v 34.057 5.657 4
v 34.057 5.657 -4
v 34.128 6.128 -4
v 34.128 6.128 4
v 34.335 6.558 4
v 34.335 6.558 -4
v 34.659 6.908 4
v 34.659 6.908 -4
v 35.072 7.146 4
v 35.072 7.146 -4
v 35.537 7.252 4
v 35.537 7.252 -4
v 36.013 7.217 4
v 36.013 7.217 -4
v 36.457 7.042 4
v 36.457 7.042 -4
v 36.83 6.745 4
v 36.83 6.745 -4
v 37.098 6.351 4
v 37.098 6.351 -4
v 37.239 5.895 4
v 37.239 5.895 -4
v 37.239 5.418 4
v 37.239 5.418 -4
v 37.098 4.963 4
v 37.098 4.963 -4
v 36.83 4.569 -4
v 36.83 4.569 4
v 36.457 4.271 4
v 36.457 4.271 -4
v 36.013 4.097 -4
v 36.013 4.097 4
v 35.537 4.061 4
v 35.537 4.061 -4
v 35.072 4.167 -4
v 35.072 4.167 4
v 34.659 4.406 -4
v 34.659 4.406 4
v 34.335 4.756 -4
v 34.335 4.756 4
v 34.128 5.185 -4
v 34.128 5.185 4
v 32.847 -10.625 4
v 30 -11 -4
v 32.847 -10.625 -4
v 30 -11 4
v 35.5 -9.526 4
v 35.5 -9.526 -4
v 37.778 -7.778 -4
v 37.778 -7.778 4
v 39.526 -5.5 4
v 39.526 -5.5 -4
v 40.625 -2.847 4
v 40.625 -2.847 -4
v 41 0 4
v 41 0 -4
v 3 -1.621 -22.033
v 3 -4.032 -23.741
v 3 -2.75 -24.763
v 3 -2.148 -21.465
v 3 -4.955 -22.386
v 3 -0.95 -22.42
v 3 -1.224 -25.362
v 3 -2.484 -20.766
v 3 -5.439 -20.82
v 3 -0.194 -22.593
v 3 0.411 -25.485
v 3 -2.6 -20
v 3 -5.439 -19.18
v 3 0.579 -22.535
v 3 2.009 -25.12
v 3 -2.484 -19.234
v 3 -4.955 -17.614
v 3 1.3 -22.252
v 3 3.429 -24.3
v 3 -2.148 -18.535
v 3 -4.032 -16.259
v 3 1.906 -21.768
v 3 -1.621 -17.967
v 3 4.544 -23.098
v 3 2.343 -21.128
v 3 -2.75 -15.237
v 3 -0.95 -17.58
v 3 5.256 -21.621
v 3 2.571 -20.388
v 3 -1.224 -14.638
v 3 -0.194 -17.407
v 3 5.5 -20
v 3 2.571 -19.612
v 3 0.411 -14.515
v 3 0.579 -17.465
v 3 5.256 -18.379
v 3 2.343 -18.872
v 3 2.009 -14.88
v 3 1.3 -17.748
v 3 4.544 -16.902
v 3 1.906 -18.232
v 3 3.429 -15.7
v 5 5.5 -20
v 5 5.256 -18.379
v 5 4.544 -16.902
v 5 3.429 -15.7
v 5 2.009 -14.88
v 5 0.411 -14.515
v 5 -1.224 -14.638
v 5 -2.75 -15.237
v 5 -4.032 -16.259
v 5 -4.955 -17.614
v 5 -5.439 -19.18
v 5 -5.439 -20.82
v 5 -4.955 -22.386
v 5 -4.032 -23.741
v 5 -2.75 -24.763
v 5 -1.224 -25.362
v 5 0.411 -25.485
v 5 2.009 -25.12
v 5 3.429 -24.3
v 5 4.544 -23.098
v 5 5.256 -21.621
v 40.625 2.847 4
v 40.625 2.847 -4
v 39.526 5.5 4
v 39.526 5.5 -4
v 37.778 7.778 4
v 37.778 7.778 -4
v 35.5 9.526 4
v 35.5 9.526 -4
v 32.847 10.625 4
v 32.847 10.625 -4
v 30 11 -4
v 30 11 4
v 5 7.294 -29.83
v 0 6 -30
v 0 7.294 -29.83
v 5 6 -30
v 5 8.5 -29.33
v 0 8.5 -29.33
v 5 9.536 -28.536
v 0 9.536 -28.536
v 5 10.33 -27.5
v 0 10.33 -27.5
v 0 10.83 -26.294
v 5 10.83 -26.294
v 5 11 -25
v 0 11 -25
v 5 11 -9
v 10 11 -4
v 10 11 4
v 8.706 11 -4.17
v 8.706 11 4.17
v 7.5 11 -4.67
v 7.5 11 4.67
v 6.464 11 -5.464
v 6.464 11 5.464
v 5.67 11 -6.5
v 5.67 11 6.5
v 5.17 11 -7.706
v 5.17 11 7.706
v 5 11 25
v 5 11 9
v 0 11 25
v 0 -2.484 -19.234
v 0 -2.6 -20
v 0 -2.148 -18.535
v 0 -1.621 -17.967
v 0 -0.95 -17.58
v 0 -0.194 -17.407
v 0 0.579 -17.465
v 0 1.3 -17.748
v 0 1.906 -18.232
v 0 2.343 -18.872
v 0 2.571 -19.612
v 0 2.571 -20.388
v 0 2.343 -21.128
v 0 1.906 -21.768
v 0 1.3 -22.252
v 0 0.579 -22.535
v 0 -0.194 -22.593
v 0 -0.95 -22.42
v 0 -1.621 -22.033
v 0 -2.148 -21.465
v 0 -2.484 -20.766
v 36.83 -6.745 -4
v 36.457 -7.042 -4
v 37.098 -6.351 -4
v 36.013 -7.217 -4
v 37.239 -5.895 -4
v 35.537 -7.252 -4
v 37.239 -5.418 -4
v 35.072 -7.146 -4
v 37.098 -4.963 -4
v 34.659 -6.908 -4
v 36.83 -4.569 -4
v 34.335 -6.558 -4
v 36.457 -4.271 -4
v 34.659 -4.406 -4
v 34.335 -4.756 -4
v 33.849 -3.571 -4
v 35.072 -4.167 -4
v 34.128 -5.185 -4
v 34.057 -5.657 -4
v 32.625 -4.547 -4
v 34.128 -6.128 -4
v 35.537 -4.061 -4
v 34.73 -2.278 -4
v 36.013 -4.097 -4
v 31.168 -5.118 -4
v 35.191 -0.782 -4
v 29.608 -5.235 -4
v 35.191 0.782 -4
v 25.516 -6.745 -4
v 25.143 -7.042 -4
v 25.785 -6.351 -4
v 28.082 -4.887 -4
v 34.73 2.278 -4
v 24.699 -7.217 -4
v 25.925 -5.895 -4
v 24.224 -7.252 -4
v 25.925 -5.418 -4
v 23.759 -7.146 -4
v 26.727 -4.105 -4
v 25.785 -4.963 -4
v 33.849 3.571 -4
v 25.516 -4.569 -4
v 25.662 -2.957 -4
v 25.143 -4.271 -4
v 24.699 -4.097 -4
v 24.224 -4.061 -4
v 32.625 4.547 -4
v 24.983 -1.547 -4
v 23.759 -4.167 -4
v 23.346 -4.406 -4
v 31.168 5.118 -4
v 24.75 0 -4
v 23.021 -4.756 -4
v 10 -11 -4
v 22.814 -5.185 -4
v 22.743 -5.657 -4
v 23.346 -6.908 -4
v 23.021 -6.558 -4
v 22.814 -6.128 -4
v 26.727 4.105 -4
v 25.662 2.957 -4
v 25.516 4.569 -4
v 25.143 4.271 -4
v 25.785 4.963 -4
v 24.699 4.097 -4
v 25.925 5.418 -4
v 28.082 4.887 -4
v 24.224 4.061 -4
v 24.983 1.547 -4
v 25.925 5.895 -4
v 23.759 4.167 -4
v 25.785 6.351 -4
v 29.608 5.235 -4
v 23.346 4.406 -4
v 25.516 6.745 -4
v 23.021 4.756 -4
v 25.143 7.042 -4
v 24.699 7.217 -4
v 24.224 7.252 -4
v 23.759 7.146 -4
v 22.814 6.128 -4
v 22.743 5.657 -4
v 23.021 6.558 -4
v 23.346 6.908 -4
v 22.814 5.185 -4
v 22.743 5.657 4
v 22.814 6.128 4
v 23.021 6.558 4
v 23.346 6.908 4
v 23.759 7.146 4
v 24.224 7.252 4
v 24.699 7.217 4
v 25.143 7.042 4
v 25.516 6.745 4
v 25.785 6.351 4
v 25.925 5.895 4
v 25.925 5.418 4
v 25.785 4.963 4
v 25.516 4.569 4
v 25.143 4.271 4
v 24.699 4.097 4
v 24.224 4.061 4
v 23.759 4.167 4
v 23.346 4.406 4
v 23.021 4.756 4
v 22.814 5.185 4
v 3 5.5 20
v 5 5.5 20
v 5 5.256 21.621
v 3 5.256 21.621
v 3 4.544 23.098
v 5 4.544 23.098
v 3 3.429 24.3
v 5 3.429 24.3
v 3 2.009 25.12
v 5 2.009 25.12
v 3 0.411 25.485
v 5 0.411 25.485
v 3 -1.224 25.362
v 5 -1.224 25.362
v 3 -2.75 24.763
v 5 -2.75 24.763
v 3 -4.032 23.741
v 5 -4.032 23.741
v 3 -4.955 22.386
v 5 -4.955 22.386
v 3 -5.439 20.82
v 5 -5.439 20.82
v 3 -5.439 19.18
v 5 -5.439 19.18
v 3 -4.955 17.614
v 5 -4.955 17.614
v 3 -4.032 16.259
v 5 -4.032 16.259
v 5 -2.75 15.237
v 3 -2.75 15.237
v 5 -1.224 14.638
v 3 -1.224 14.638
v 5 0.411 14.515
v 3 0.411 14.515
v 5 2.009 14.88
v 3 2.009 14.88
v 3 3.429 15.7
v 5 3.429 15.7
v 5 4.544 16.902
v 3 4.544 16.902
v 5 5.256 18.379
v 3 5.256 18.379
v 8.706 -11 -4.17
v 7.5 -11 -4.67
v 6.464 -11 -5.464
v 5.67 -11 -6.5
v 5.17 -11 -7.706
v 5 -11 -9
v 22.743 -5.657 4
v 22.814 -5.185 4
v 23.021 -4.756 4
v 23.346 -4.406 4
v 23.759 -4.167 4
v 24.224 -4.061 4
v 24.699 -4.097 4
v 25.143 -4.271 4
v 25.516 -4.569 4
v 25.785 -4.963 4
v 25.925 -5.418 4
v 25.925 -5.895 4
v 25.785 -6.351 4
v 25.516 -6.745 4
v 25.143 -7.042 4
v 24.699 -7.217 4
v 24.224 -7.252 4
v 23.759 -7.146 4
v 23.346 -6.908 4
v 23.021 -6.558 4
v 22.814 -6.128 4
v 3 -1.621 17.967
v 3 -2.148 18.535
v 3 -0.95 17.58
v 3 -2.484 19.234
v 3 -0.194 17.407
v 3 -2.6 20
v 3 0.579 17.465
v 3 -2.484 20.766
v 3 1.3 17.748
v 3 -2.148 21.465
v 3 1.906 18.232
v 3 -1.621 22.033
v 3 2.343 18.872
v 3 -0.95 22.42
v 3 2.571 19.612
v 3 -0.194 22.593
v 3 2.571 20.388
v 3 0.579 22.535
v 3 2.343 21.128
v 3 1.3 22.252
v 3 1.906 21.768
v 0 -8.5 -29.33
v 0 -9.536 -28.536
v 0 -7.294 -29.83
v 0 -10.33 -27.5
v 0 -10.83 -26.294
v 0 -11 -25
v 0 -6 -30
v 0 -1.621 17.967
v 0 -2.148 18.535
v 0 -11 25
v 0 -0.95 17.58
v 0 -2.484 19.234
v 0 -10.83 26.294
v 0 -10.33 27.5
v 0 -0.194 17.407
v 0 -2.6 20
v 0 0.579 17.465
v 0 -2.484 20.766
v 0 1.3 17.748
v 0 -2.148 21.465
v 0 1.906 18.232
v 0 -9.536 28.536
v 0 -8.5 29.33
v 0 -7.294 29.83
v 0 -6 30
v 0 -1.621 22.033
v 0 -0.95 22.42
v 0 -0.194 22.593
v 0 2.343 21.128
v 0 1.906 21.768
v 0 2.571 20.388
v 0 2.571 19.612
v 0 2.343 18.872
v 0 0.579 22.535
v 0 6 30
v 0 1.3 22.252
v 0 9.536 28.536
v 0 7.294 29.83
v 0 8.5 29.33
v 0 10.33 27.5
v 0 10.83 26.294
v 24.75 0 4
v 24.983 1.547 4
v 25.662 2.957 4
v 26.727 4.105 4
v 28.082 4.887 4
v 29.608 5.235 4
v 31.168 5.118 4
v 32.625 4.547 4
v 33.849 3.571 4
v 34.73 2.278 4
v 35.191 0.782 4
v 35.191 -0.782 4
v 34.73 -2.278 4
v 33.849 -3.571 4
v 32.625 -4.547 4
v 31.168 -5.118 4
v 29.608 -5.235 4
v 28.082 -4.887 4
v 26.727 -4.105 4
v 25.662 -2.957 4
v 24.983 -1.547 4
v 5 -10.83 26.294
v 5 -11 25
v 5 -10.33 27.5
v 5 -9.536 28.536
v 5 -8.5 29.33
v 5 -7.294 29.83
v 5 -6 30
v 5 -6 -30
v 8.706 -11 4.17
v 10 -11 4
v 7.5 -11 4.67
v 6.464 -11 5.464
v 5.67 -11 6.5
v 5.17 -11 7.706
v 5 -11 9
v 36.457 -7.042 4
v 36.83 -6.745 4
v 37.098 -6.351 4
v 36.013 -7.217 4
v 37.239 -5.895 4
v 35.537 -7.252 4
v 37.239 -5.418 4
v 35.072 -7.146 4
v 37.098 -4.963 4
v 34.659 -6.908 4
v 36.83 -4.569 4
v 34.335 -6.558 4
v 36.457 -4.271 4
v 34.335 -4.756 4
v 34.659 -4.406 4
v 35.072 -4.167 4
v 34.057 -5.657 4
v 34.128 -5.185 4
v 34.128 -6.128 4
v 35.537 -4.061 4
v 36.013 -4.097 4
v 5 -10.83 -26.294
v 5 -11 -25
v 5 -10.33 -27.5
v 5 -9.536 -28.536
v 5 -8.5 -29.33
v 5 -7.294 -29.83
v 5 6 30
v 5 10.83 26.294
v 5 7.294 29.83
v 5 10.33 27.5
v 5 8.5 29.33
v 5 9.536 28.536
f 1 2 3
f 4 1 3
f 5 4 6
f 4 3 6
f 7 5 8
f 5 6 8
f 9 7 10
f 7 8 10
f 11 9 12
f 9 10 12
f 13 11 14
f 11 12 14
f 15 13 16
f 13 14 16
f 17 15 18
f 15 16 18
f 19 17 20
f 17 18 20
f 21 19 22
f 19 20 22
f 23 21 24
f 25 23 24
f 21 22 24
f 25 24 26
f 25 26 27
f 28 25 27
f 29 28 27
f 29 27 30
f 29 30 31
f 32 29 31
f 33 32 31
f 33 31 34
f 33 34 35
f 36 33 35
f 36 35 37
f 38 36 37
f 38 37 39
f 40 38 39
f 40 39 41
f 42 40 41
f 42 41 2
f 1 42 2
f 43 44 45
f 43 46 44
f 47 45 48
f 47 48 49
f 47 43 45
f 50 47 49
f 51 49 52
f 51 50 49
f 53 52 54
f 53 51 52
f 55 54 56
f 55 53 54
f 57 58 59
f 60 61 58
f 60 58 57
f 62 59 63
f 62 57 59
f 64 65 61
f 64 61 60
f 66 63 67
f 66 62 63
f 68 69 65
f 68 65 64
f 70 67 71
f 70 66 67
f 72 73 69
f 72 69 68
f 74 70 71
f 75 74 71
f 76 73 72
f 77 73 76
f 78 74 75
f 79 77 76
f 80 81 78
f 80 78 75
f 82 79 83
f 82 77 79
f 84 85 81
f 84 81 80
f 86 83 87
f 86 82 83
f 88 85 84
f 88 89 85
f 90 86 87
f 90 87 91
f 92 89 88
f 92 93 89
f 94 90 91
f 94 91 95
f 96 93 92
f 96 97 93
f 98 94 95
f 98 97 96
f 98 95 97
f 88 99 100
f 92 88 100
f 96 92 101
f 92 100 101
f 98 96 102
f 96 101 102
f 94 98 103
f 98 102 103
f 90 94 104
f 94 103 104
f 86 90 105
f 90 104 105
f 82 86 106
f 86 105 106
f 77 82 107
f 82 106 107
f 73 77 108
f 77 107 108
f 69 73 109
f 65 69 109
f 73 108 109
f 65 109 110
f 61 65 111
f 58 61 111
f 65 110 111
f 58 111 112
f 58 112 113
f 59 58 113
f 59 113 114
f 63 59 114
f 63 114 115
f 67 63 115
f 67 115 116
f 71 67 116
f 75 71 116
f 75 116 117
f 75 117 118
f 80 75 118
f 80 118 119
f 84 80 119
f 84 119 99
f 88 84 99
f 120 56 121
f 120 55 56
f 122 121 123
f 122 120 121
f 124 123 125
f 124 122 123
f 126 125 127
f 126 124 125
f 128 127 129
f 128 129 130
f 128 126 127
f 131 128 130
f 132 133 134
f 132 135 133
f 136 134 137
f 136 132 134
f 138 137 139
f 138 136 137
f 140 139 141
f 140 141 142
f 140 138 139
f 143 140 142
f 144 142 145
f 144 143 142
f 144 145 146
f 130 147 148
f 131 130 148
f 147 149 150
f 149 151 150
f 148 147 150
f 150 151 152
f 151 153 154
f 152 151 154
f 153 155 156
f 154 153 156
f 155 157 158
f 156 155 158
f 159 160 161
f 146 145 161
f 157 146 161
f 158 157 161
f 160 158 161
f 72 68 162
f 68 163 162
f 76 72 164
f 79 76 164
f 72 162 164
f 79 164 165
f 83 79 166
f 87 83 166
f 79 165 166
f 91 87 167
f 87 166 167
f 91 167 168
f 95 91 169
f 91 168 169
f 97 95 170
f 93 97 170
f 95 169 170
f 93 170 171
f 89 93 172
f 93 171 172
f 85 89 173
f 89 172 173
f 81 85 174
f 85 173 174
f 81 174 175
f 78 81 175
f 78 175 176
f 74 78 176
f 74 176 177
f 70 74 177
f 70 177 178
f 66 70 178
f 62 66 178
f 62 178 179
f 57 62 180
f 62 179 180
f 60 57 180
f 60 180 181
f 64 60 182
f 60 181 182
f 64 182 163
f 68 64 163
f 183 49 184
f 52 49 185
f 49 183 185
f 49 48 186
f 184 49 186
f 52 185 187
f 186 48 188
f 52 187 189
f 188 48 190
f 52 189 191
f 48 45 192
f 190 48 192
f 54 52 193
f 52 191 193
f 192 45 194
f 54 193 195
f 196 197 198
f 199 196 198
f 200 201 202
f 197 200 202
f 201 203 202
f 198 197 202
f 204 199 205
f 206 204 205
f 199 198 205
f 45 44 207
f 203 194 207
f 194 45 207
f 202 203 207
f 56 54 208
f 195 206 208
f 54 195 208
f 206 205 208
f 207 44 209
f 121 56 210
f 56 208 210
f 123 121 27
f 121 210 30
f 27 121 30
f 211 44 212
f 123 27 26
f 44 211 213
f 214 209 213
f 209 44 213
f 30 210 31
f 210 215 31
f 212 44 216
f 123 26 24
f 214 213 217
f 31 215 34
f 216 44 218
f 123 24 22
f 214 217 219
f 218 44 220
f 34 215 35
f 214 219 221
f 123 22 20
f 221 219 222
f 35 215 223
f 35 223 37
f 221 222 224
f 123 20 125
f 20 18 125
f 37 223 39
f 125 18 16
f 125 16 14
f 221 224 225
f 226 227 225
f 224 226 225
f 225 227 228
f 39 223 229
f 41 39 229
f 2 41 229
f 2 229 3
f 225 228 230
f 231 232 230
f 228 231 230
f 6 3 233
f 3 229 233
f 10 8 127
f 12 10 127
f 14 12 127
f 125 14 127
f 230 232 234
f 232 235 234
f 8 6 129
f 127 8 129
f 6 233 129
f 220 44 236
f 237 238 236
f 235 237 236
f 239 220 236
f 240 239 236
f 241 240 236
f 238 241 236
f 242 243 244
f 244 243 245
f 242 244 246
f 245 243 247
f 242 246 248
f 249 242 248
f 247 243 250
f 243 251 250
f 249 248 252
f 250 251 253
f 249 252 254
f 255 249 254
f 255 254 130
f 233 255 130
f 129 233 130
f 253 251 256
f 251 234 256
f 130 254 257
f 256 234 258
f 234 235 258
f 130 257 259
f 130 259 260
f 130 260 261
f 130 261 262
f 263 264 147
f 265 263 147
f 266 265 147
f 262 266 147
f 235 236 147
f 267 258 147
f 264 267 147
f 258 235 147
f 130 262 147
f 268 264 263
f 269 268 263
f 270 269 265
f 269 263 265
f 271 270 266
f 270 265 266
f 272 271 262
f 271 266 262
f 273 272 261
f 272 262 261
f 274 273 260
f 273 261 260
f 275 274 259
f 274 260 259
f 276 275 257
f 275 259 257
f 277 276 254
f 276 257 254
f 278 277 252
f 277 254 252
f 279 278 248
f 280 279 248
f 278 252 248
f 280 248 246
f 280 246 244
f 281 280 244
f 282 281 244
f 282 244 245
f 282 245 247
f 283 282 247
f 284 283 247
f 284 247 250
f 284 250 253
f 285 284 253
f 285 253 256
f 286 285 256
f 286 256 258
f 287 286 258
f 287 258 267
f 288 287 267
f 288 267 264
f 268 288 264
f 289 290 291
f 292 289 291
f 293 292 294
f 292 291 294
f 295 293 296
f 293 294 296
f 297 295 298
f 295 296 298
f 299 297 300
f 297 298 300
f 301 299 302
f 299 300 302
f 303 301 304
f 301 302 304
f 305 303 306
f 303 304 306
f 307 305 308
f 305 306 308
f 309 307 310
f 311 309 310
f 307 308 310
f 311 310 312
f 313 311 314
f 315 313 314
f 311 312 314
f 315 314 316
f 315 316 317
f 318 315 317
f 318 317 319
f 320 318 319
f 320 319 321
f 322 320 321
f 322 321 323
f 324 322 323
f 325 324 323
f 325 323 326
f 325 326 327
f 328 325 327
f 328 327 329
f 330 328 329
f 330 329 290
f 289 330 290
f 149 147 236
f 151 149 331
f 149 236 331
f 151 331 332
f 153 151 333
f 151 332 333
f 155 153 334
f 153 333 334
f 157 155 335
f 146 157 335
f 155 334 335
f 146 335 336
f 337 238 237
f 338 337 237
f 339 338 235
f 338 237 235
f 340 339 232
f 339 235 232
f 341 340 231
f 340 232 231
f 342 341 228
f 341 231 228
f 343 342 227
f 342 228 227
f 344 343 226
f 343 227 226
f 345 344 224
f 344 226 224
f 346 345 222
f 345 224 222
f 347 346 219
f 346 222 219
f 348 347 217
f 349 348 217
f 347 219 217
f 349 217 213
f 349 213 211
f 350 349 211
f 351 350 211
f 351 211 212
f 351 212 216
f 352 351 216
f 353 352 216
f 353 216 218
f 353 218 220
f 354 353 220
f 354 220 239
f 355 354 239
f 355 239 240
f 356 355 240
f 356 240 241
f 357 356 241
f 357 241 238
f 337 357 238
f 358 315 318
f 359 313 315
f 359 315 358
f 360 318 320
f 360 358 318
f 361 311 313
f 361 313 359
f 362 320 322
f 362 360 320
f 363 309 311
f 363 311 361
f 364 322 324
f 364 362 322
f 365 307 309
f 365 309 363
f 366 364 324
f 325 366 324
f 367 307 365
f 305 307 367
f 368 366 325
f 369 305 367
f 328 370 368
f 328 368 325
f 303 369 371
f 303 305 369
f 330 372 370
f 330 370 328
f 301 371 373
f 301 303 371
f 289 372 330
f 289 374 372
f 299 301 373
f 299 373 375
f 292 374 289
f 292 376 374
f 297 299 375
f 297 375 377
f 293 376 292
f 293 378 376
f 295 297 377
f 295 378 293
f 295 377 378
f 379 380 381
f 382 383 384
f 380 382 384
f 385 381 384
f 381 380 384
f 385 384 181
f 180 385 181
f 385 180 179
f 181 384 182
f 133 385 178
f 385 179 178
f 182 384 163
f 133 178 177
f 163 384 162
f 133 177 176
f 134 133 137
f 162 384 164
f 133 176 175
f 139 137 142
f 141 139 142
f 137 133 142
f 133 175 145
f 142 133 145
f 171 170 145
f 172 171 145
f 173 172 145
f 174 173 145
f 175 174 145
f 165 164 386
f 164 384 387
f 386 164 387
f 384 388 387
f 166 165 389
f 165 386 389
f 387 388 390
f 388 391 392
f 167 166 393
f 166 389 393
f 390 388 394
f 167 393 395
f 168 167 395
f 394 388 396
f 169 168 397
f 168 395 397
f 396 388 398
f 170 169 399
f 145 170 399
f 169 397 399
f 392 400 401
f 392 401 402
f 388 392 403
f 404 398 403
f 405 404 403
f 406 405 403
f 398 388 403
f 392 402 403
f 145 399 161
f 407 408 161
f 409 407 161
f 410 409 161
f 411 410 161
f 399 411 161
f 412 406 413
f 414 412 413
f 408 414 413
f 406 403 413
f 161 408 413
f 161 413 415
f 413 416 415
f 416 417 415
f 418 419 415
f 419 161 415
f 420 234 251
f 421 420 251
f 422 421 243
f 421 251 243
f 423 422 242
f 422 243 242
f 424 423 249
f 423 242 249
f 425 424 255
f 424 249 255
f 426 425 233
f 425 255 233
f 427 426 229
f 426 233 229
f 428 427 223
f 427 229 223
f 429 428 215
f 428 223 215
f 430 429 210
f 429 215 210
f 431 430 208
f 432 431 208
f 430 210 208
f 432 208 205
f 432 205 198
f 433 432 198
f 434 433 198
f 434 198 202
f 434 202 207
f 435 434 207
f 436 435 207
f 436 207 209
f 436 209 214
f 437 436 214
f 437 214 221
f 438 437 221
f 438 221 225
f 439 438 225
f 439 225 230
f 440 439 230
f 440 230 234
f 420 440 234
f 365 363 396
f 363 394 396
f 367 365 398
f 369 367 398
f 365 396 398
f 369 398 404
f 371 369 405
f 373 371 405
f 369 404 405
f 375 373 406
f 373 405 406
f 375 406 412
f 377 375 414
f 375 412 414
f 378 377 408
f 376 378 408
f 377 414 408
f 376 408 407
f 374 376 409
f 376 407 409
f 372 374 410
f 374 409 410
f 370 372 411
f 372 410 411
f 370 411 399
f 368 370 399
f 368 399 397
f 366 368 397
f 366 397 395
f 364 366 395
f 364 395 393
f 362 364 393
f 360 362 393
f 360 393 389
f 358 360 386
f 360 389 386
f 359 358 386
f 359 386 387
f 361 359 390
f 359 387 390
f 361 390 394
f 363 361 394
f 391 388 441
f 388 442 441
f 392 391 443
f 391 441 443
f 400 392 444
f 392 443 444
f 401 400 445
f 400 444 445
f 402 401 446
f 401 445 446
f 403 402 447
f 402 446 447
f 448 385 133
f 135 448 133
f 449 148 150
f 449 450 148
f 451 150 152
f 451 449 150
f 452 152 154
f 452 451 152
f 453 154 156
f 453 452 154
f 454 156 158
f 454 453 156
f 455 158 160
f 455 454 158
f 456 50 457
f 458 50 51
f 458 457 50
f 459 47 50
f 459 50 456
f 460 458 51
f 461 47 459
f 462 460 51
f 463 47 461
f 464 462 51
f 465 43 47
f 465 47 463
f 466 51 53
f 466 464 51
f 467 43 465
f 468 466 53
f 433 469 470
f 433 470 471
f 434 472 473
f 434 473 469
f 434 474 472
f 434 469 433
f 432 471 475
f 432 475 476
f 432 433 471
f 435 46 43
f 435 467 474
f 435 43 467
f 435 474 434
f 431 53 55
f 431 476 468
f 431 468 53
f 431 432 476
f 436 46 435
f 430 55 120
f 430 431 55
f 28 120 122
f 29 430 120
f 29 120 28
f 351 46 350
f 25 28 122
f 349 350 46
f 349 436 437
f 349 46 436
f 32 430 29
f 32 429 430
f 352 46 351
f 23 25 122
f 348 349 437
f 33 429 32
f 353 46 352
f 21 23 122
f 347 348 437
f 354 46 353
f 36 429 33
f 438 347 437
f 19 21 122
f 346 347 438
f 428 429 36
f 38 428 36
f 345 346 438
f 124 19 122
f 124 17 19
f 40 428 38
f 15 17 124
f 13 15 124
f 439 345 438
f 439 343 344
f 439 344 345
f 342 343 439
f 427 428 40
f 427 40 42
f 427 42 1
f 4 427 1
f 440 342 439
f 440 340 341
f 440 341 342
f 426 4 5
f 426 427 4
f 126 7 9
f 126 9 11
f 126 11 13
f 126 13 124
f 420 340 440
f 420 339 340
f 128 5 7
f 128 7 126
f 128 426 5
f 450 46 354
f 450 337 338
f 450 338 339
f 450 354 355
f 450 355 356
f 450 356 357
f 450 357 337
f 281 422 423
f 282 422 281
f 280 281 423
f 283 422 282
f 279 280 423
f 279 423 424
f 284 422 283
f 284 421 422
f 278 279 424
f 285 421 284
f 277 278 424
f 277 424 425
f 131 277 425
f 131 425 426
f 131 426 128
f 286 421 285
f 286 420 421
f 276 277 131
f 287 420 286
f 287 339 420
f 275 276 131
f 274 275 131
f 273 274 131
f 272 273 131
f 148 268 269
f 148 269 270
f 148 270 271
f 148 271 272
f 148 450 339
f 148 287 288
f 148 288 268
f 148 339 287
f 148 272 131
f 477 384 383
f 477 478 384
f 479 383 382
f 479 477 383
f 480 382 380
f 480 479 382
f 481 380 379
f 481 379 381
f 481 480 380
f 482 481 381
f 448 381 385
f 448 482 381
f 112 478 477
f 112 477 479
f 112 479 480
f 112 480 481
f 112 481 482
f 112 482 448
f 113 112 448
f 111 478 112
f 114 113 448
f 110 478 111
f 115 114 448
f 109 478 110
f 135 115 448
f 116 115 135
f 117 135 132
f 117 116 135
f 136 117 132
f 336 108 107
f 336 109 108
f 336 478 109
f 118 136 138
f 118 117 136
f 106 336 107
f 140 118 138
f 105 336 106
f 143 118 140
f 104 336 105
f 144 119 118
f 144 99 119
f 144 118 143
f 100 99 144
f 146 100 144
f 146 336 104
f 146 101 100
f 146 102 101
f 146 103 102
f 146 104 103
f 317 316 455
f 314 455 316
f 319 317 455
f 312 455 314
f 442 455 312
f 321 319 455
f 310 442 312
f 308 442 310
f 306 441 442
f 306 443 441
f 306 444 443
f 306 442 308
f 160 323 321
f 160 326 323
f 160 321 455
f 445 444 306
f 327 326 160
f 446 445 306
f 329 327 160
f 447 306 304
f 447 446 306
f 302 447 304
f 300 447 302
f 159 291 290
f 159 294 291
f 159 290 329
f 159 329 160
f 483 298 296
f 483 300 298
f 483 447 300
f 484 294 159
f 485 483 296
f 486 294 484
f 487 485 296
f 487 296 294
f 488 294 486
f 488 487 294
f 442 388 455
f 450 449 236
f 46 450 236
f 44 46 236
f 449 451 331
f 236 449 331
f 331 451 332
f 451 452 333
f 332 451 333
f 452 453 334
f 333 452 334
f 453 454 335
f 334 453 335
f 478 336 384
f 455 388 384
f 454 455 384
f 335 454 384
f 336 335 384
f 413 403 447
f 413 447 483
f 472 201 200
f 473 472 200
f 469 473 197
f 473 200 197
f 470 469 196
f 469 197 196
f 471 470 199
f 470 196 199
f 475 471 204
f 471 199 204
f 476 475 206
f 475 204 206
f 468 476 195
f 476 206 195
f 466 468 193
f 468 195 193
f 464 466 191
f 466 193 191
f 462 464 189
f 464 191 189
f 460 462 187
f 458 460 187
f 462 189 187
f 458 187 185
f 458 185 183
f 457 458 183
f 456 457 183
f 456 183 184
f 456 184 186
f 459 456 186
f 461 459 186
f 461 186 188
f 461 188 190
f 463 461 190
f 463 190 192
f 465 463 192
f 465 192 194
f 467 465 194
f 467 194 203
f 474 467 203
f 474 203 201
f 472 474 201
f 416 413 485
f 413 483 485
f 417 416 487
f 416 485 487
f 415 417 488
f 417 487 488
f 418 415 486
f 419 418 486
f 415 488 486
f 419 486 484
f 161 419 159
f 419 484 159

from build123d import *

# Parameters (mm, degrees)
F1_W            = 22
F1_H            = 26
F1_H_2          = 8
F2_DEPTH        = 5
F3_DEPTH        = 41
F5_D            = 10.5
F6_D            = 3.2
F7_R            = 10.99999
F8_R            = 5
F10_D           = 5.2
F10_CBORE_D     = 11
F10_CBORE_DEPTH = 2
F11_R           = 5


# Not quite as in the source:
# - a fillet or chamfer is up to 0.001 mm smaller than in the source, because OpenCascade refuses the exact size


with BuildPart() as f2:
    # F1 (on Right) → F2 (new body)
    with BuildSketch(Plane.YZ):
        with Locations((0, 17)):
            Rectangle(F1_W, F1_H)
        Rectangle(F1_W, F1_H_2)
        with Locations((0, -17)):
            Rectangle(F1_W, F1_H)
    extrude(amount=F2_DEPTH)

    # F1 (on Right) → F3 (join)
    with BuildSketch(Plane.YZ):
        Rectangle(F1_W, F1_H_2)
    extrude(amount=F3_DEPTH)

    # F5 (through all)
    with Locations(Plane.XY.offset(4)):
        with Locations((30, 0)):
            Hole(F5_D / 2)

    # F6 (through all)
    with Locations(Plane.XY.offset(4)):
        with Locations((24.3431457505, -5.6568542495), (24.3431457505, 5.6568542495), (35.6568542495, 5.6568542495), (35.6568542495, -5.6568542495)):
            Hole(F6_D / 2)

    # F7 (radius 11 in the source; OpenCascade refuses exactly that, so slightly less here)
    f7_edges = [f2.edges().sort_by_distance(p)[0] for p in [
        (41, 11, 0),
        (41, -11, 0),
    ]]
    fillet(f7_edges, radius=F7_R)

    # F8
    f8_edges = [f2.edges().sort_by_distance(p)[0] for p in [
        (5, 0, 4),
        (5, 0, -4),
    ]]
    fillet(f8_edges, radius=F8_R)

    # F10 (through all)
    with Locations(Plane.YZ.offset(5)):
        with Locations((0, 20), (0, -20)):
            CounterBoreHole(F10_D / 2, F10_CBORE_D / 2, F10_CBORE_DEPTH)

    # F11
    f11_edges = [f2.edges().sort_by_distance(p)[0] for p in [
        (2.5, -11, 30),
        (2.5, 11, 30),
        (2.5, -11, -30),
        (2.5, 11, -30),
    ]]
    fillet(f11_edges, radius=F11_R)


solid = f2.part
